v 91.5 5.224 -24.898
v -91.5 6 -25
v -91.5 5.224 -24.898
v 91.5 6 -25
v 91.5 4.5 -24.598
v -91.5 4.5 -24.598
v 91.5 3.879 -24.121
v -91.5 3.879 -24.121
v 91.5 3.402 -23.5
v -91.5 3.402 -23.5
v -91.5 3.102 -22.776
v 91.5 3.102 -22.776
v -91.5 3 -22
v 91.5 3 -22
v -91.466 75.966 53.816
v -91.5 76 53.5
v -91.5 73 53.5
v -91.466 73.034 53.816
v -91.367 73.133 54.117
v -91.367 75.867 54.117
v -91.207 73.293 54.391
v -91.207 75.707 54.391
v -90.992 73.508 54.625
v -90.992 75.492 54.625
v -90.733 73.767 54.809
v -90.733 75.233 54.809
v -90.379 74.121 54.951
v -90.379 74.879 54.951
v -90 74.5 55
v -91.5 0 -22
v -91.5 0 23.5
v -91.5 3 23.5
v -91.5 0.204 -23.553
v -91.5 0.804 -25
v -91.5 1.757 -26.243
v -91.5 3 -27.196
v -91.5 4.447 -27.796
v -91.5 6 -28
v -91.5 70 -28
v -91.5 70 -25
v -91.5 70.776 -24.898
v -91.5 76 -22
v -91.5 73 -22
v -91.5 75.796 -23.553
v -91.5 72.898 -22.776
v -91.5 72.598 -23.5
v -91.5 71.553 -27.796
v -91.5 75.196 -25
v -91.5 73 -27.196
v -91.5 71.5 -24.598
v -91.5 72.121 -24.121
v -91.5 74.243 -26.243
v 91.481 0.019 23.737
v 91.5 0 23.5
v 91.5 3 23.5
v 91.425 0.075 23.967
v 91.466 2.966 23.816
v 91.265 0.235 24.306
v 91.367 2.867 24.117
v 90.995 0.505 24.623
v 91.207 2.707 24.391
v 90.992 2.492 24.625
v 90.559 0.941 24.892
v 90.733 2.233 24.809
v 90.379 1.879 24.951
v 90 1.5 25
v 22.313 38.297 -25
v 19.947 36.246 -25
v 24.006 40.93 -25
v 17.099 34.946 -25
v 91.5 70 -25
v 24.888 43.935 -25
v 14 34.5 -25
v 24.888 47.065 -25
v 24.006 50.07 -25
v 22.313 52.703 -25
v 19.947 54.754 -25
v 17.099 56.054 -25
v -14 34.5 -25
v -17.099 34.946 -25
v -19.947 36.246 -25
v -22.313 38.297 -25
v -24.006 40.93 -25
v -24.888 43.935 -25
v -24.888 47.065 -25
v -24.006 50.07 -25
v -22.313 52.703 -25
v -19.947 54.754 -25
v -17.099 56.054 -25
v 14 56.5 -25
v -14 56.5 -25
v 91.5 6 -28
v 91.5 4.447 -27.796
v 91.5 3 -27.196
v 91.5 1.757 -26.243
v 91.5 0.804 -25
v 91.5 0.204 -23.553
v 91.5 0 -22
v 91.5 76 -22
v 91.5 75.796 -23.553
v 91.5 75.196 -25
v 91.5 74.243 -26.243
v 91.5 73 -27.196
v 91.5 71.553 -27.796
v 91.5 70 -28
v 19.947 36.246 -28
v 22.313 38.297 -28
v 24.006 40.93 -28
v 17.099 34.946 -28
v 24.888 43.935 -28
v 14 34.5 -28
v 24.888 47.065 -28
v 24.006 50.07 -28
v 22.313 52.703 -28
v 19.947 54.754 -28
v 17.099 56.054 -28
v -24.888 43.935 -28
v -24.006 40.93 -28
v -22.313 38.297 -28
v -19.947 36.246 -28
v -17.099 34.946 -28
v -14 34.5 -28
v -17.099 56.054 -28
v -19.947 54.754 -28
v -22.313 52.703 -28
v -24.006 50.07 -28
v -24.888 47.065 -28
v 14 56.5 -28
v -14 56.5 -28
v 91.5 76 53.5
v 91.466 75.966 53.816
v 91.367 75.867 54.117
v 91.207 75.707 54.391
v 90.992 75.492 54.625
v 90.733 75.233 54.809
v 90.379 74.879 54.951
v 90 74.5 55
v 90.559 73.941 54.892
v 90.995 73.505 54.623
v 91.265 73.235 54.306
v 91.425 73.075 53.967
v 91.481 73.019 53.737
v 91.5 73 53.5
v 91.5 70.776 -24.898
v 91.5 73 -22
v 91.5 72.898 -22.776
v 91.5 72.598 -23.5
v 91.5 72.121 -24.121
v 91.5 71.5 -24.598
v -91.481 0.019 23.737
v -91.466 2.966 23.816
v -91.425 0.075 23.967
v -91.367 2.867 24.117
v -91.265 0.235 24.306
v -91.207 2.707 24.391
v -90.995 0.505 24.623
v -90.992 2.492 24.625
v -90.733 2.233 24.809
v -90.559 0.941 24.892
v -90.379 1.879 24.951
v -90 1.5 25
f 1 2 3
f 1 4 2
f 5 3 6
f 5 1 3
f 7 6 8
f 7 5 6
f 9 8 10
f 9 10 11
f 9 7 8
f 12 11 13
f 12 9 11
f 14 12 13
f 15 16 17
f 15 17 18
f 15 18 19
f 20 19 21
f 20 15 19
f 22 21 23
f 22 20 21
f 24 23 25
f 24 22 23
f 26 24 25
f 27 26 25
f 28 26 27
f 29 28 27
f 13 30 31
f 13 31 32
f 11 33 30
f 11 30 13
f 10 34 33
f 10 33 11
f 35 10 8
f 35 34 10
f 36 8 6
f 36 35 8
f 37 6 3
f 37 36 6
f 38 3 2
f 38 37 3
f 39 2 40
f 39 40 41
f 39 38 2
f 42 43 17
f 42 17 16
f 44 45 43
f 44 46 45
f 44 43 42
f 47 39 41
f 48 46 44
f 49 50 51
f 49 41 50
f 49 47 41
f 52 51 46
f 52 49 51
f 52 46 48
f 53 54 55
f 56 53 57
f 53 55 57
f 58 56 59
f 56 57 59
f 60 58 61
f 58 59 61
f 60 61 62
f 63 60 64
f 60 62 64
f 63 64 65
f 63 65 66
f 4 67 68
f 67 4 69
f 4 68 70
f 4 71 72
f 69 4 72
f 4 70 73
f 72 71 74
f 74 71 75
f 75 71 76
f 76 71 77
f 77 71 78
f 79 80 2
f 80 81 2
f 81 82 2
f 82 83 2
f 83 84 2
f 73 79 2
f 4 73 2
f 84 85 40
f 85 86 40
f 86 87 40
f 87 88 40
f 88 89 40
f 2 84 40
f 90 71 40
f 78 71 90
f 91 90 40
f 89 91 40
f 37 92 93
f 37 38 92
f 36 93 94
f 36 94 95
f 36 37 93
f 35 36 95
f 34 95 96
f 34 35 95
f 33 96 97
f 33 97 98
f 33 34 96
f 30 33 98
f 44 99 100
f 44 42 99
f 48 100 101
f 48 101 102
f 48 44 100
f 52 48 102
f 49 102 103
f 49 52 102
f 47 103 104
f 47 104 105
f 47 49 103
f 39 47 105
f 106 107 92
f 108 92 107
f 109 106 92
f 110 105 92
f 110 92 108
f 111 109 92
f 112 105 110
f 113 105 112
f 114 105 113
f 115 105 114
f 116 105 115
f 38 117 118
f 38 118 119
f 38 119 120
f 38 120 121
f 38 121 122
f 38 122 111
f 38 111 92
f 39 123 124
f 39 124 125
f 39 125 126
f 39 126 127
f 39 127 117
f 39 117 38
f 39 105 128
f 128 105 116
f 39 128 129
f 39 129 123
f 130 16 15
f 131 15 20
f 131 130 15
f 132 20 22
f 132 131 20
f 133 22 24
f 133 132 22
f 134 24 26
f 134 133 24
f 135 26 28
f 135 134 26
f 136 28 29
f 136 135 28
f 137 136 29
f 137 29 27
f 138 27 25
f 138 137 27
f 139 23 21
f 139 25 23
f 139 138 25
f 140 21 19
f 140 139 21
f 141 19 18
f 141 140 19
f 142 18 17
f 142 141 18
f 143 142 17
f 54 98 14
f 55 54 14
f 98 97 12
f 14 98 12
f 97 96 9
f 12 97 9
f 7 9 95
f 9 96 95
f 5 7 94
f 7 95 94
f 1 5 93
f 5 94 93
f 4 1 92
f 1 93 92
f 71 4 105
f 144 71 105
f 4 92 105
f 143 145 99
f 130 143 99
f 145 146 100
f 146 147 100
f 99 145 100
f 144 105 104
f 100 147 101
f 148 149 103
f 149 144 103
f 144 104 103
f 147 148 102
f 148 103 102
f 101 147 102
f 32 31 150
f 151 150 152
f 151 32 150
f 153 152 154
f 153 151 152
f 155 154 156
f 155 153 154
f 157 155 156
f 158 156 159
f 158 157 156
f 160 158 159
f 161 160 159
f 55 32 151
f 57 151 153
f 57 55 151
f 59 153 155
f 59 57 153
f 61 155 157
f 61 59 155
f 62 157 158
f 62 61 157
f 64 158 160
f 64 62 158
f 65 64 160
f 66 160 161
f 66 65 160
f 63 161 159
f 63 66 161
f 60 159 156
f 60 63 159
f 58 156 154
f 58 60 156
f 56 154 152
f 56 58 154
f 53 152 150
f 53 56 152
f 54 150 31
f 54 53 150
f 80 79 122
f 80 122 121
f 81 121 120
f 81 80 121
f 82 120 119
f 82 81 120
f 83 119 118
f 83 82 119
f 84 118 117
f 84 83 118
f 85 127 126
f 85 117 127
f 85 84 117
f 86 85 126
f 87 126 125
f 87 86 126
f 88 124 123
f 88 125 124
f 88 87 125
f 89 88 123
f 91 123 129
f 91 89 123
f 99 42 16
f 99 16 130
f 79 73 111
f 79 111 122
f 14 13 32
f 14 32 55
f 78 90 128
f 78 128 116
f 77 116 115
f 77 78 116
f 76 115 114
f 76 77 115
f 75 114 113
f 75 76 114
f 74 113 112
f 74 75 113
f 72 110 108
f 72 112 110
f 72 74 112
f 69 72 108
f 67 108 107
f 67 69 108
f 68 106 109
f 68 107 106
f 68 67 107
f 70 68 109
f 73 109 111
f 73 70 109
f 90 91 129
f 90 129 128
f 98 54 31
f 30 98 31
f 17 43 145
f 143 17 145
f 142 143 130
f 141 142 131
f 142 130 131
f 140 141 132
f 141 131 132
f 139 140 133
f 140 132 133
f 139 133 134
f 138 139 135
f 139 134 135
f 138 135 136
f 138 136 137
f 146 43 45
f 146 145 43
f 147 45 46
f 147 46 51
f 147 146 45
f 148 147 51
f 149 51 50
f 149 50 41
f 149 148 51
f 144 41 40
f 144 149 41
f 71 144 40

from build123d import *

# Parameters (mm, degrees)
SKETCH1_W           = 183
SKETCH1_H           = 50
BOSS_EXTRUDE1_DEPTH = 3
SKETCH2_W           = 183
SKETCH2_H           = 76
BOSS_EXTRUDE2_DEPTH = 3
SKETCH3_W           = 183
SKETCH3_H           = 3
BOSS_EXTRUDE3_DEPTH = 80
FILLET2_R           = 1.5
CUT_EXTRUDE1_REACH  = 145.347
FILLET3_R           = 3
FILLET4_R           = 6


with BuildPart() as part:
    # Sketch1 → Boss-Extrude1 (new body)
    with BuildSketch(Plane(origin=(0, 0, 0), x_dir=(1, 0, 0), z_dir=(0, 1, 0))):
        Rectangle(SKETCH1_W, SKETCH1_H)
    extrude(amount=BOSS_EXTRUDE1_DEPTH)

    # Sketch2 → Boss-Extrude2 (add)
    with BuildSketch(Plane(origin=(0, 0, -25), x_dir=(-1, 0, 0), z_dir=(0, 0, -1))):
        with Locations((0, 38)):
            Rectangle(SKETCH2_W, SKETCH2_H)
    extrude(amount=BOSS_EXTRUDE2_DEPTH)

    # Sketch3 → Boss-Extrude3 (add)
    with BuildSketch(Plane.XY.offset(-25)):
        with Locations((0, 74.5)):
            Rectangle(SKETCH3_W, SKETCH3_H)
    extrude(amount=BOSS_EXTRUDE3_DEPTH)

    # Fillet2
    fillet2_edges = [part.edges().sort_by_distance(p)[0] for p in [
        (0, 3, 25),
        (-91.5, 74.5, 55),
        (0, 73, 55),
        (91.5, 74.5, 55),
        (0, 76, 55),
        (0, 0, 25),
        (91.5, 1.5, 25),
        (-91.5, 1.5, 25),
    ]]
    fillet(fillet2_edges, radius=FILLET2_R - 0.0001)  # a hair under: the kernel refuses the full size

    # Sketch4 → Cut-Extrude1 (cut, up to next)
    with BuildSketch(Plane.XY.offset(-25), mode=Mode.PRIVATE) as cut_extrude1_sk1:
        with BuildLine():
            Line((-14, 56.5), (14, 56.5))
            ThreePointArc((14, 56.5), (25, 45.5), (14, 34.5))
            Line((14, 34.5), (-14, 34.5))
            ThreePointArc((-14, 34.5), (-25, 45.5), (-14, 56.5))
        make_face()
    cut_extrude1_tool1 = extrude(cut_extrude1_sk1.sketch, amount=-CUT_EXTRUDE1_REACH, mode=Mode.PRIVATE) & part.part
    add(cut_extrude1_tool1.solids().sort_by_distance((0, 45.5, -25))[0], mode=Mode.SUBTRACT)

    # Fillet3
    fillet3_edges = [part.edges().sort_by_distance(p)[0] for p in [
        (0, 73, -25),
        (0, 3, -25),
    ]]
    fillet(fillet3_edges, radius=FILLET3_R)

    # Fillet4
    fillet4_edges = [part.edges().sort_by_distance(p)[0] for p in [
        (0, 0, -28),
        (0, 76, -28),
    ]]
    fillet(fillet4_edges, radius=FILLET4_R)


solid = part.part
